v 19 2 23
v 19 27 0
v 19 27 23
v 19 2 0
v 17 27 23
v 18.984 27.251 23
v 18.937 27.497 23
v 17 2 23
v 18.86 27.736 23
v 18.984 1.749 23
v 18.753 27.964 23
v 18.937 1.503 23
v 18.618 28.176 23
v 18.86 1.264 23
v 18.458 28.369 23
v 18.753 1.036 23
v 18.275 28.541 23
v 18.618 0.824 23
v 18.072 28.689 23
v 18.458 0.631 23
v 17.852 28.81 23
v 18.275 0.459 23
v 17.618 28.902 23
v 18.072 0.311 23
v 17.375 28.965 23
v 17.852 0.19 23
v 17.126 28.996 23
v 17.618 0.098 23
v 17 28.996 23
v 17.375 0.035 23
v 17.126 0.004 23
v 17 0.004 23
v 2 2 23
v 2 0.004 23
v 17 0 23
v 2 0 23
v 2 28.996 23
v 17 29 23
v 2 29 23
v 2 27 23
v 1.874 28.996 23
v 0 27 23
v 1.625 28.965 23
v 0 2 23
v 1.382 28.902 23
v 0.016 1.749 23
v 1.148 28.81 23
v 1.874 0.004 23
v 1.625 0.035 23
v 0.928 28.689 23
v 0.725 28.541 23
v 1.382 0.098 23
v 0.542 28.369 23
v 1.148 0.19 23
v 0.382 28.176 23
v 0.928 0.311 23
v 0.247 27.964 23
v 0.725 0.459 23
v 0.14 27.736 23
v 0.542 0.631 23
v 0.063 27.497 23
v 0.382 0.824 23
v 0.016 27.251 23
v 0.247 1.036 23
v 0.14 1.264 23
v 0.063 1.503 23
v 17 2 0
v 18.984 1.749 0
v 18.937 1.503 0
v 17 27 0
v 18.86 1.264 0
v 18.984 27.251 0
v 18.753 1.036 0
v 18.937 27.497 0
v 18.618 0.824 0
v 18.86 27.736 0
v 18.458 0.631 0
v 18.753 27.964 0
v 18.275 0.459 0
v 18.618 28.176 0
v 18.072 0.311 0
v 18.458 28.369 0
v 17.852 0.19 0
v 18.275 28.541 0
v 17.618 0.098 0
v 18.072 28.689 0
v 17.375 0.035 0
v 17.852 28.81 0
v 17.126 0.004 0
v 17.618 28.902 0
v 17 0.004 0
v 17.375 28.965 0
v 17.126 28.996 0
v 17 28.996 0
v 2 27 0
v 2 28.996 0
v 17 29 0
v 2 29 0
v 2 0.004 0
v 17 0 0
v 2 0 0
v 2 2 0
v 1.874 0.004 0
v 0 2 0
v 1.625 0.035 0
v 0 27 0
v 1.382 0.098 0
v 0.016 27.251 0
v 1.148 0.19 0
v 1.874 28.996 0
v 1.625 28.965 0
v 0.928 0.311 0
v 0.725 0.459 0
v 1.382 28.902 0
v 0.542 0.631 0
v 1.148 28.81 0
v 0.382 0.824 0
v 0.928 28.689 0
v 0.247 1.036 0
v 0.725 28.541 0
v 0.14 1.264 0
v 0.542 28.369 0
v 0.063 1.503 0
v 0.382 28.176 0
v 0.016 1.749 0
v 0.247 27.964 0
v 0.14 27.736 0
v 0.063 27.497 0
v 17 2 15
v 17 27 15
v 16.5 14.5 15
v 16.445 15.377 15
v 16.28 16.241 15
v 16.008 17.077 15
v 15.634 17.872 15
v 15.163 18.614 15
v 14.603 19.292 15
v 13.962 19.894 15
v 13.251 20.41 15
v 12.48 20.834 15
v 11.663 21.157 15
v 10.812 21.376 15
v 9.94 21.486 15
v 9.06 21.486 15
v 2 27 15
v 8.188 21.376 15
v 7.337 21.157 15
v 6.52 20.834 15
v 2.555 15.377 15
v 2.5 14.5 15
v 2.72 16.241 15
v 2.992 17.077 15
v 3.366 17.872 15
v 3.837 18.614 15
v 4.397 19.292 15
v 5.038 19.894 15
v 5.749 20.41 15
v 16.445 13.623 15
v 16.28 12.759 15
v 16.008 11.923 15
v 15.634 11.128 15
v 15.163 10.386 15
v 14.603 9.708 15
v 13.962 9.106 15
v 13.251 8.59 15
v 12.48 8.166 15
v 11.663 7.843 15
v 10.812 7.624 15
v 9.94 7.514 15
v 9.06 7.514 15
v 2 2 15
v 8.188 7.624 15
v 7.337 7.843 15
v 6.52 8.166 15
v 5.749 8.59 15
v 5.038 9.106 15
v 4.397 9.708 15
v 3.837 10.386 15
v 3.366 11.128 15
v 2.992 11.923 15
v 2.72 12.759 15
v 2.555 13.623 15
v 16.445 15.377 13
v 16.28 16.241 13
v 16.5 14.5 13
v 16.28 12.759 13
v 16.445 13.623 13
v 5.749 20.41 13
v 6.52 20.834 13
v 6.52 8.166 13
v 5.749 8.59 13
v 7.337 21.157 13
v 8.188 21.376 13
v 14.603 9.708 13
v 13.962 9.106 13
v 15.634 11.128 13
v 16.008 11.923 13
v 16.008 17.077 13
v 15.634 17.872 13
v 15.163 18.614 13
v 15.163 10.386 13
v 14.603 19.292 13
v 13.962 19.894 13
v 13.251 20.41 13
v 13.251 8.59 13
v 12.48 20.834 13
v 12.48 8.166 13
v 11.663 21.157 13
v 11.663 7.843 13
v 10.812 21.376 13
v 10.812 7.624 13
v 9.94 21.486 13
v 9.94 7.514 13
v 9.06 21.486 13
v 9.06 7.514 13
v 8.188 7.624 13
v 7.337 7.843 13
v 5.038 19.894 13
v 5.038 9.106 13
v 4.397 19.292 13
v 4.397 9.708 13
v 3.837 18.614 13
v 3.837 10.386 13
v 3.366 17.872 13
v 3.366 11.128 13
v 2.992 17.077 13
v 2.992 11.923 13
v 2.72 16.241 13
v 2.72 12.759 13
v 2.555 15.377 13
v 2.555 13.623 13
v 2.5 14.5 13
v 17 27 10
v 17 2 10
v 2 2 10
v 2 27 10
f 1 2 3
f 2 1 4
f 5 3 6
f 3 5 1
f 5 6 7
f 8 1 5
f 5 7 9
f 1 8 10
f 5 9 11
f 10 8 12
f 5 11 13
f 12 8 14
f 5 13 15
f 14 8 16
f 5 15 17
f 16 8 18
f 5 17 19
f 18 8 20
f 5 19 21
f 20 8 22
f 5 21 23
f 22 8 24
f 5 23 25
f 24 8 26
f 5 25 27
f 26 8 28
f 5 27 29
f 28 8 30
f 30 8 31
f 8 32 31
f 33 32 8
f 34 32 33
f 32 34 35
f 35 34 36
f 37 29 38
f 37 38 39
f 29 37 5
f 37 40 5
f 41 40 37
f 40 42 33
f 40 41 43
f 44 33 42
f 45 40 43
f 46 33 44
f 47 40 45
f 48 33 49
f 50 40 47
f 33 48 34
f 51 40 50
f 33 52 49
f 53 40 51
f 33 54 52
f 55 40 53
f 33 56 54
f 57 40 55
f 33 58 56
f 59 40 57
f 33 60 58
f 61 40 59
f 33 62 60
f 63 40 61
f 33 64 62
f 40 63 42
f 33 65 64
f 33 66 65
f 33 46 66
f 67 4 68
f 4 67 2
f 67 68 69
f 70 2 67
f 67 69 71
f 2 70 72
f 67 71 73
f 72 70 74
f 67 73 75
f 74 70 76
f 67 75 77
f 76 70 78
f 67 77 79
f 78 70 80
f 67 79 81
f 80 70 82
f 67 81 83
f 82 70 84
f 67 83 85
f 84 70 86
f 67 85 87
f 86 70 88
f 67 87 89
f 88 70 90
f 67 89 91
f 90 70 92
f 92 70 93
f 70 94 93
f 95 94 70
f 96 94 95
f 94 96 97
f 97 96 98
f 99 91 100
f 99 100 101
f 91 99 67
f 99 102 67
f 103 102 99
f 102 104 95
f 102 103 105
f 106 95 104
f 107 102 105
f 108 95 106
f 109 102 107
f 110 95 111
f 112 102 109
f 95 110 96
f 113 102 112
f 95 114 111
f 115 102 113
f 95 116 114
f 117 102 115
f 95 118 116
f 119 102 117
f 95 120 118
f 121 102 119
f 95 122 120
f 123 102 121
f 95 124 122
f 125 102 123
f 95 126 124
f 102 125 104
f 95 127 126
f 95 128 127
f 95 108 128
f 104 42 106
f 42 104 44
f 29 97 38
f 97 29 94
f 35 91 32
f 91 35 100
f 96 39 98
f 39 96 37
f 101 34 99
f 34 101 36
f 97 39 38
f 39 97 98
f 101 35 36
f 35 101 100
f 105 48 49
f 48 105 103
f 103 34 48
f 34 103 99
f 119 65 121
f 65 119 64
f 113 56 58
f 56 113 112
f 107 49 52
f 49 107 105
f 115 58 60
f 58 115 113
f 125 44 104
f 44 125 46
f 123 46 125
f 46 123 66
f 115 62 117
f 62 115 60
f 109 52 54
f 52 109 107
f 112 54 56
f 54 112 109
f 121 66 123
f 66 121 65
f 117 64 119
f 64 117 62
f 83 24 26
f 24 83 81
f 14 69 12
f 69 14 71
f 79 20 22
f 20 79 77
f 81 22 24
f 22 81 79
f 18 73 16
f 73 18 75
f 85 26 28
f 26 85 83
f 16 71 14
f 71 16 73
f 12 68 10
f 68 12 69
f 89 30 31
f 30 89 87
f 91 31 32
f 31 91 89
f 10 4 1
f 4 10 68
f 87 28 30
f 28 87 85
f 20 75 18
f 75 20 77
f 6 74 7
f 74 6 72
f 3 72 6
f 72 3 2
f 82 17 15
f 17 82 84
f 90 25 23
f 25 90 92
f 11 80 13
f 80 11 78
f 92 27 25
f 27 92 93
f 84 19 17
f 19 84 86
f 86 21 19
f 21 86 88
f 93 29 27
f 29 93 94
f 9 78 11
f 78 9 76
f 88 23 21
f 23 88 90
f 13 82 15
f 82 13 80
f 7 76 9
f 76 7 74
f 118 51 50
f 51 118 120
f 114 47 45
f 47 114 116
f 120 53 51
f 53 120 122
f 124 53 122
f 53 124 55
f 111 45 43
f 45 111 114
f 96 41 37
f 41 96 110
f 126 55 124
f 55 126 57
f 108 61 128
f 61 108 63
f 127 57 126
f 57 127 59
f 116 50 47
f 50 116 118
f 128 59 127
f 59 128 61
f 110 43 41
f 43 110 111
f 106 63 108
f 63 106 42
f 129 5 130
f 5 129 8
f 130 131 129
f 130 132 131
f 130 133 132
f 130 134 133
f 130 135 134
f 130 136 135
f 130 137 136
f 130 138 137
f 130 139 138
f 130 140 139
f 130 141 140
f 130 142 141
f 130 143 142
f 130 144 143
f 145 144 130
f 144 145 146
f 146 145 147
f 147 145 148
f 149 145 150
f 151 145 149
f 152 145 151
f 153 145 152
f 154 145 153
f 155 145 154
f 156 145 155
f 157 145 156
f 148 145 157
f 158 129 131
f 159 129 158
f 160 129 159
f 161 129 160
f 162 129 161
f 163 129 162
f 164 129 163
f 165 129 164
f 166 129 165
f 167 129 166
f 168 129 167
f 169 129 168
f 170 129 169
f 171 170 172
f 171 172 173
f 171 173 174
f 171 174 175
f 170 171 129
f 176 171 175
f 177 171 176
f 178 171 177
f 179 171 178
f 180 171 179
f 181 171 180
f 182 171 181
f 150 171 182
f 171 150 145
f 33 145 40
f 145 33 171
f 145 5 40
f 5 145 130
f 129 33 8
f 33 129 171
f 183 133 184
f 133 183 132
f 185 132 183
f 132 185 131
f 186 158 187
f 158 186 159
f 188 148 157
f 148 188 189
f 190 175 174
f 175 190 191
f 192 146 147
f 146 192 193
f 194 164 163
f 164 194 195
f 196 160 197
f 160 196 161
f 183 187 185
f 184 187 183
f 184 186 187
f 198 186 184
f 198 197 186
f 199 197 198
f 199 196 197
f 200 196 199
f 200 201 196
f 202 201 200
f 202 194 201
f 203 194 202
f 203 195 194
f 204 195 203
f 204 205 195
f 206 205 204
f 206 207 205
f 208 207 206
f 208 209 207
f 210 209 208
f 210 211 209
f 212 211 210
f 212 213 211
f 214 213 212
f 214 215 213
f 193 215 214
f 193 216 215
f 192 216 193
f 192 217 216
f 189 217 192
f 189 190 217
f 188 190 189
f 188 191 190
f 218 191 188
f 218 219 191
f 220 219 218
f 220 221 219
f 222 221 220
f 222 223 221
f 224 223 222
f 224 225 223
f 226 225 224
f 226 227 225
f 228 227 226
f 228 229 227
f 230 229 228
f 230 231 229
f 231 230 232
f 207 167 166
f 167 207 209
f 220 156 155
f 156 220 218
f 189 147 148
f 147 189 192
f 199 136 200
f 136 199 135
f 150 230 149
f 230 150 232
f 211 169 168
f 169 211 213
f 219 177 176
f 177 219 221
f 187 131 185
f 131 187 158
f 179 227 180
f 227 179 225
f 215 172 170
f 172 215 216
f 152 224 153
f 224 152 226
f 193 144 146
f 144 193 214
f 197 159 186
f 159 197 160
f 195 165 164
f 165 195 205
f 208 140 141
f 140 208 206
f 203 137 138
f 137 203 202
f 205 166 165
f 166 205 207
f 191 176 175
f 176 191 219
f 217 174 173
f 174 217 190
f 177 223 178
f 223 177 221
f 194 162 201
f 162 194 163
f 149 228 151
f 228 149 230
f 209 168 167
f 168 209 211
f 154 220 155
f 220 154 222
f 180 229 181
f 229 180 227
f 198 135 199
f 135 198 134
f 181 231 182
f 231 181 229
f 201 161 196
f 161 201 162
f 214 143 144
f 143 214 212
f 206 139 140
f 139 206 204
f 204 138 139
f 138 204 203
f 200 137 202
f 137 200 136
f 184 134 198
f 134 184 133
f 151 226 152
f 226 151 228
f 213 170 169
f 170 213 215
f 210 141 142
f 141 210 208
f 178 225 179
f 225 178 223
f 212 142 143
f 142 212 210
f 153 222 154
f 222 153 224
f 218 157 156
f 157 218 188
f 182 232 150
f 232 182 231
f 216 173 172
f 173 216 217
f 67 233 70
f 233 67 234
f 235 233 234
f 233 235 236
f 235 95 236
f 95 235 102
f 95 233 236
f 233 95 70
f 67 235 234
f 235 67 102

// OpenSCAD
/* [Heights of piece] */
inner_top_height = 10; // Height that cover upper furniture foot
inner_bottom_height = 10; // Height that cover lower furniture foot

/* [Feet dimensions] */
inner_width = 15;
inner_length = 25;

/* [Other dimensions] */
border_size = 2; //Size of border: Total size of piece will be inner_width/length + 2*border_size
junction_size = 3; // Size of the junction between the two pieces

/* [Stand of the upper Ragrund dimension] */

stand_height = 2; 
stand_radius = 7;


/* [Hidden] */

total_width = inner_width + border_size*2;
total_length = inner_length + border_size*2;
total_height = inner_top_height + inner_bottom_height + junction_size;
	
cylinder_radius = (1/2*sqrt(pow(inner_width,2) + pow(inner_length,2)) + border_size);

difference() {
	//Round corners
	union() {
		translate([0, border_size, 0]) cube ([total_width, inner_length, total_height]);
		translate([border_size, 0, 0]) cube ([inner_width, total_length, total_height]);
		translate([border_size, border_size, 0]) cylinder (h = total_height, r=border_size, $fn=50);            
		translate([inner_width+border_size, border_size, 0]) cylinder (h = total_height, r=border_size, $fn=50);        
		translate([inner_width+border_size, inner_length+border_size, 0]) cylinder (h = total_height, r=border_size, $fn=50);        
		translate([border_size, inner_length+border_size, 0]) cylinder (h = total_height, r=border_size, $fn=50);

	}
	
	
	//Bottom removal
	translate([border_size, border_size, -10]) {
		cube([inner_width, inner_length, inner_bottom_height+10]);
	}
	
	//Top removal
	translate([border_size, border_size, inner_bottom_height + junction_size]) {
		union() {
			translate([0,0,stand_height]) cube([inner_width, inner_length, inner_top_height+10]);
			translate([inner_width/2,inner_length/2,2.5 + stand_height/2]) cylinder(h = 5+stand_height, r= stand_radius, center = true, $fn=50);
		}
	}
	
}
